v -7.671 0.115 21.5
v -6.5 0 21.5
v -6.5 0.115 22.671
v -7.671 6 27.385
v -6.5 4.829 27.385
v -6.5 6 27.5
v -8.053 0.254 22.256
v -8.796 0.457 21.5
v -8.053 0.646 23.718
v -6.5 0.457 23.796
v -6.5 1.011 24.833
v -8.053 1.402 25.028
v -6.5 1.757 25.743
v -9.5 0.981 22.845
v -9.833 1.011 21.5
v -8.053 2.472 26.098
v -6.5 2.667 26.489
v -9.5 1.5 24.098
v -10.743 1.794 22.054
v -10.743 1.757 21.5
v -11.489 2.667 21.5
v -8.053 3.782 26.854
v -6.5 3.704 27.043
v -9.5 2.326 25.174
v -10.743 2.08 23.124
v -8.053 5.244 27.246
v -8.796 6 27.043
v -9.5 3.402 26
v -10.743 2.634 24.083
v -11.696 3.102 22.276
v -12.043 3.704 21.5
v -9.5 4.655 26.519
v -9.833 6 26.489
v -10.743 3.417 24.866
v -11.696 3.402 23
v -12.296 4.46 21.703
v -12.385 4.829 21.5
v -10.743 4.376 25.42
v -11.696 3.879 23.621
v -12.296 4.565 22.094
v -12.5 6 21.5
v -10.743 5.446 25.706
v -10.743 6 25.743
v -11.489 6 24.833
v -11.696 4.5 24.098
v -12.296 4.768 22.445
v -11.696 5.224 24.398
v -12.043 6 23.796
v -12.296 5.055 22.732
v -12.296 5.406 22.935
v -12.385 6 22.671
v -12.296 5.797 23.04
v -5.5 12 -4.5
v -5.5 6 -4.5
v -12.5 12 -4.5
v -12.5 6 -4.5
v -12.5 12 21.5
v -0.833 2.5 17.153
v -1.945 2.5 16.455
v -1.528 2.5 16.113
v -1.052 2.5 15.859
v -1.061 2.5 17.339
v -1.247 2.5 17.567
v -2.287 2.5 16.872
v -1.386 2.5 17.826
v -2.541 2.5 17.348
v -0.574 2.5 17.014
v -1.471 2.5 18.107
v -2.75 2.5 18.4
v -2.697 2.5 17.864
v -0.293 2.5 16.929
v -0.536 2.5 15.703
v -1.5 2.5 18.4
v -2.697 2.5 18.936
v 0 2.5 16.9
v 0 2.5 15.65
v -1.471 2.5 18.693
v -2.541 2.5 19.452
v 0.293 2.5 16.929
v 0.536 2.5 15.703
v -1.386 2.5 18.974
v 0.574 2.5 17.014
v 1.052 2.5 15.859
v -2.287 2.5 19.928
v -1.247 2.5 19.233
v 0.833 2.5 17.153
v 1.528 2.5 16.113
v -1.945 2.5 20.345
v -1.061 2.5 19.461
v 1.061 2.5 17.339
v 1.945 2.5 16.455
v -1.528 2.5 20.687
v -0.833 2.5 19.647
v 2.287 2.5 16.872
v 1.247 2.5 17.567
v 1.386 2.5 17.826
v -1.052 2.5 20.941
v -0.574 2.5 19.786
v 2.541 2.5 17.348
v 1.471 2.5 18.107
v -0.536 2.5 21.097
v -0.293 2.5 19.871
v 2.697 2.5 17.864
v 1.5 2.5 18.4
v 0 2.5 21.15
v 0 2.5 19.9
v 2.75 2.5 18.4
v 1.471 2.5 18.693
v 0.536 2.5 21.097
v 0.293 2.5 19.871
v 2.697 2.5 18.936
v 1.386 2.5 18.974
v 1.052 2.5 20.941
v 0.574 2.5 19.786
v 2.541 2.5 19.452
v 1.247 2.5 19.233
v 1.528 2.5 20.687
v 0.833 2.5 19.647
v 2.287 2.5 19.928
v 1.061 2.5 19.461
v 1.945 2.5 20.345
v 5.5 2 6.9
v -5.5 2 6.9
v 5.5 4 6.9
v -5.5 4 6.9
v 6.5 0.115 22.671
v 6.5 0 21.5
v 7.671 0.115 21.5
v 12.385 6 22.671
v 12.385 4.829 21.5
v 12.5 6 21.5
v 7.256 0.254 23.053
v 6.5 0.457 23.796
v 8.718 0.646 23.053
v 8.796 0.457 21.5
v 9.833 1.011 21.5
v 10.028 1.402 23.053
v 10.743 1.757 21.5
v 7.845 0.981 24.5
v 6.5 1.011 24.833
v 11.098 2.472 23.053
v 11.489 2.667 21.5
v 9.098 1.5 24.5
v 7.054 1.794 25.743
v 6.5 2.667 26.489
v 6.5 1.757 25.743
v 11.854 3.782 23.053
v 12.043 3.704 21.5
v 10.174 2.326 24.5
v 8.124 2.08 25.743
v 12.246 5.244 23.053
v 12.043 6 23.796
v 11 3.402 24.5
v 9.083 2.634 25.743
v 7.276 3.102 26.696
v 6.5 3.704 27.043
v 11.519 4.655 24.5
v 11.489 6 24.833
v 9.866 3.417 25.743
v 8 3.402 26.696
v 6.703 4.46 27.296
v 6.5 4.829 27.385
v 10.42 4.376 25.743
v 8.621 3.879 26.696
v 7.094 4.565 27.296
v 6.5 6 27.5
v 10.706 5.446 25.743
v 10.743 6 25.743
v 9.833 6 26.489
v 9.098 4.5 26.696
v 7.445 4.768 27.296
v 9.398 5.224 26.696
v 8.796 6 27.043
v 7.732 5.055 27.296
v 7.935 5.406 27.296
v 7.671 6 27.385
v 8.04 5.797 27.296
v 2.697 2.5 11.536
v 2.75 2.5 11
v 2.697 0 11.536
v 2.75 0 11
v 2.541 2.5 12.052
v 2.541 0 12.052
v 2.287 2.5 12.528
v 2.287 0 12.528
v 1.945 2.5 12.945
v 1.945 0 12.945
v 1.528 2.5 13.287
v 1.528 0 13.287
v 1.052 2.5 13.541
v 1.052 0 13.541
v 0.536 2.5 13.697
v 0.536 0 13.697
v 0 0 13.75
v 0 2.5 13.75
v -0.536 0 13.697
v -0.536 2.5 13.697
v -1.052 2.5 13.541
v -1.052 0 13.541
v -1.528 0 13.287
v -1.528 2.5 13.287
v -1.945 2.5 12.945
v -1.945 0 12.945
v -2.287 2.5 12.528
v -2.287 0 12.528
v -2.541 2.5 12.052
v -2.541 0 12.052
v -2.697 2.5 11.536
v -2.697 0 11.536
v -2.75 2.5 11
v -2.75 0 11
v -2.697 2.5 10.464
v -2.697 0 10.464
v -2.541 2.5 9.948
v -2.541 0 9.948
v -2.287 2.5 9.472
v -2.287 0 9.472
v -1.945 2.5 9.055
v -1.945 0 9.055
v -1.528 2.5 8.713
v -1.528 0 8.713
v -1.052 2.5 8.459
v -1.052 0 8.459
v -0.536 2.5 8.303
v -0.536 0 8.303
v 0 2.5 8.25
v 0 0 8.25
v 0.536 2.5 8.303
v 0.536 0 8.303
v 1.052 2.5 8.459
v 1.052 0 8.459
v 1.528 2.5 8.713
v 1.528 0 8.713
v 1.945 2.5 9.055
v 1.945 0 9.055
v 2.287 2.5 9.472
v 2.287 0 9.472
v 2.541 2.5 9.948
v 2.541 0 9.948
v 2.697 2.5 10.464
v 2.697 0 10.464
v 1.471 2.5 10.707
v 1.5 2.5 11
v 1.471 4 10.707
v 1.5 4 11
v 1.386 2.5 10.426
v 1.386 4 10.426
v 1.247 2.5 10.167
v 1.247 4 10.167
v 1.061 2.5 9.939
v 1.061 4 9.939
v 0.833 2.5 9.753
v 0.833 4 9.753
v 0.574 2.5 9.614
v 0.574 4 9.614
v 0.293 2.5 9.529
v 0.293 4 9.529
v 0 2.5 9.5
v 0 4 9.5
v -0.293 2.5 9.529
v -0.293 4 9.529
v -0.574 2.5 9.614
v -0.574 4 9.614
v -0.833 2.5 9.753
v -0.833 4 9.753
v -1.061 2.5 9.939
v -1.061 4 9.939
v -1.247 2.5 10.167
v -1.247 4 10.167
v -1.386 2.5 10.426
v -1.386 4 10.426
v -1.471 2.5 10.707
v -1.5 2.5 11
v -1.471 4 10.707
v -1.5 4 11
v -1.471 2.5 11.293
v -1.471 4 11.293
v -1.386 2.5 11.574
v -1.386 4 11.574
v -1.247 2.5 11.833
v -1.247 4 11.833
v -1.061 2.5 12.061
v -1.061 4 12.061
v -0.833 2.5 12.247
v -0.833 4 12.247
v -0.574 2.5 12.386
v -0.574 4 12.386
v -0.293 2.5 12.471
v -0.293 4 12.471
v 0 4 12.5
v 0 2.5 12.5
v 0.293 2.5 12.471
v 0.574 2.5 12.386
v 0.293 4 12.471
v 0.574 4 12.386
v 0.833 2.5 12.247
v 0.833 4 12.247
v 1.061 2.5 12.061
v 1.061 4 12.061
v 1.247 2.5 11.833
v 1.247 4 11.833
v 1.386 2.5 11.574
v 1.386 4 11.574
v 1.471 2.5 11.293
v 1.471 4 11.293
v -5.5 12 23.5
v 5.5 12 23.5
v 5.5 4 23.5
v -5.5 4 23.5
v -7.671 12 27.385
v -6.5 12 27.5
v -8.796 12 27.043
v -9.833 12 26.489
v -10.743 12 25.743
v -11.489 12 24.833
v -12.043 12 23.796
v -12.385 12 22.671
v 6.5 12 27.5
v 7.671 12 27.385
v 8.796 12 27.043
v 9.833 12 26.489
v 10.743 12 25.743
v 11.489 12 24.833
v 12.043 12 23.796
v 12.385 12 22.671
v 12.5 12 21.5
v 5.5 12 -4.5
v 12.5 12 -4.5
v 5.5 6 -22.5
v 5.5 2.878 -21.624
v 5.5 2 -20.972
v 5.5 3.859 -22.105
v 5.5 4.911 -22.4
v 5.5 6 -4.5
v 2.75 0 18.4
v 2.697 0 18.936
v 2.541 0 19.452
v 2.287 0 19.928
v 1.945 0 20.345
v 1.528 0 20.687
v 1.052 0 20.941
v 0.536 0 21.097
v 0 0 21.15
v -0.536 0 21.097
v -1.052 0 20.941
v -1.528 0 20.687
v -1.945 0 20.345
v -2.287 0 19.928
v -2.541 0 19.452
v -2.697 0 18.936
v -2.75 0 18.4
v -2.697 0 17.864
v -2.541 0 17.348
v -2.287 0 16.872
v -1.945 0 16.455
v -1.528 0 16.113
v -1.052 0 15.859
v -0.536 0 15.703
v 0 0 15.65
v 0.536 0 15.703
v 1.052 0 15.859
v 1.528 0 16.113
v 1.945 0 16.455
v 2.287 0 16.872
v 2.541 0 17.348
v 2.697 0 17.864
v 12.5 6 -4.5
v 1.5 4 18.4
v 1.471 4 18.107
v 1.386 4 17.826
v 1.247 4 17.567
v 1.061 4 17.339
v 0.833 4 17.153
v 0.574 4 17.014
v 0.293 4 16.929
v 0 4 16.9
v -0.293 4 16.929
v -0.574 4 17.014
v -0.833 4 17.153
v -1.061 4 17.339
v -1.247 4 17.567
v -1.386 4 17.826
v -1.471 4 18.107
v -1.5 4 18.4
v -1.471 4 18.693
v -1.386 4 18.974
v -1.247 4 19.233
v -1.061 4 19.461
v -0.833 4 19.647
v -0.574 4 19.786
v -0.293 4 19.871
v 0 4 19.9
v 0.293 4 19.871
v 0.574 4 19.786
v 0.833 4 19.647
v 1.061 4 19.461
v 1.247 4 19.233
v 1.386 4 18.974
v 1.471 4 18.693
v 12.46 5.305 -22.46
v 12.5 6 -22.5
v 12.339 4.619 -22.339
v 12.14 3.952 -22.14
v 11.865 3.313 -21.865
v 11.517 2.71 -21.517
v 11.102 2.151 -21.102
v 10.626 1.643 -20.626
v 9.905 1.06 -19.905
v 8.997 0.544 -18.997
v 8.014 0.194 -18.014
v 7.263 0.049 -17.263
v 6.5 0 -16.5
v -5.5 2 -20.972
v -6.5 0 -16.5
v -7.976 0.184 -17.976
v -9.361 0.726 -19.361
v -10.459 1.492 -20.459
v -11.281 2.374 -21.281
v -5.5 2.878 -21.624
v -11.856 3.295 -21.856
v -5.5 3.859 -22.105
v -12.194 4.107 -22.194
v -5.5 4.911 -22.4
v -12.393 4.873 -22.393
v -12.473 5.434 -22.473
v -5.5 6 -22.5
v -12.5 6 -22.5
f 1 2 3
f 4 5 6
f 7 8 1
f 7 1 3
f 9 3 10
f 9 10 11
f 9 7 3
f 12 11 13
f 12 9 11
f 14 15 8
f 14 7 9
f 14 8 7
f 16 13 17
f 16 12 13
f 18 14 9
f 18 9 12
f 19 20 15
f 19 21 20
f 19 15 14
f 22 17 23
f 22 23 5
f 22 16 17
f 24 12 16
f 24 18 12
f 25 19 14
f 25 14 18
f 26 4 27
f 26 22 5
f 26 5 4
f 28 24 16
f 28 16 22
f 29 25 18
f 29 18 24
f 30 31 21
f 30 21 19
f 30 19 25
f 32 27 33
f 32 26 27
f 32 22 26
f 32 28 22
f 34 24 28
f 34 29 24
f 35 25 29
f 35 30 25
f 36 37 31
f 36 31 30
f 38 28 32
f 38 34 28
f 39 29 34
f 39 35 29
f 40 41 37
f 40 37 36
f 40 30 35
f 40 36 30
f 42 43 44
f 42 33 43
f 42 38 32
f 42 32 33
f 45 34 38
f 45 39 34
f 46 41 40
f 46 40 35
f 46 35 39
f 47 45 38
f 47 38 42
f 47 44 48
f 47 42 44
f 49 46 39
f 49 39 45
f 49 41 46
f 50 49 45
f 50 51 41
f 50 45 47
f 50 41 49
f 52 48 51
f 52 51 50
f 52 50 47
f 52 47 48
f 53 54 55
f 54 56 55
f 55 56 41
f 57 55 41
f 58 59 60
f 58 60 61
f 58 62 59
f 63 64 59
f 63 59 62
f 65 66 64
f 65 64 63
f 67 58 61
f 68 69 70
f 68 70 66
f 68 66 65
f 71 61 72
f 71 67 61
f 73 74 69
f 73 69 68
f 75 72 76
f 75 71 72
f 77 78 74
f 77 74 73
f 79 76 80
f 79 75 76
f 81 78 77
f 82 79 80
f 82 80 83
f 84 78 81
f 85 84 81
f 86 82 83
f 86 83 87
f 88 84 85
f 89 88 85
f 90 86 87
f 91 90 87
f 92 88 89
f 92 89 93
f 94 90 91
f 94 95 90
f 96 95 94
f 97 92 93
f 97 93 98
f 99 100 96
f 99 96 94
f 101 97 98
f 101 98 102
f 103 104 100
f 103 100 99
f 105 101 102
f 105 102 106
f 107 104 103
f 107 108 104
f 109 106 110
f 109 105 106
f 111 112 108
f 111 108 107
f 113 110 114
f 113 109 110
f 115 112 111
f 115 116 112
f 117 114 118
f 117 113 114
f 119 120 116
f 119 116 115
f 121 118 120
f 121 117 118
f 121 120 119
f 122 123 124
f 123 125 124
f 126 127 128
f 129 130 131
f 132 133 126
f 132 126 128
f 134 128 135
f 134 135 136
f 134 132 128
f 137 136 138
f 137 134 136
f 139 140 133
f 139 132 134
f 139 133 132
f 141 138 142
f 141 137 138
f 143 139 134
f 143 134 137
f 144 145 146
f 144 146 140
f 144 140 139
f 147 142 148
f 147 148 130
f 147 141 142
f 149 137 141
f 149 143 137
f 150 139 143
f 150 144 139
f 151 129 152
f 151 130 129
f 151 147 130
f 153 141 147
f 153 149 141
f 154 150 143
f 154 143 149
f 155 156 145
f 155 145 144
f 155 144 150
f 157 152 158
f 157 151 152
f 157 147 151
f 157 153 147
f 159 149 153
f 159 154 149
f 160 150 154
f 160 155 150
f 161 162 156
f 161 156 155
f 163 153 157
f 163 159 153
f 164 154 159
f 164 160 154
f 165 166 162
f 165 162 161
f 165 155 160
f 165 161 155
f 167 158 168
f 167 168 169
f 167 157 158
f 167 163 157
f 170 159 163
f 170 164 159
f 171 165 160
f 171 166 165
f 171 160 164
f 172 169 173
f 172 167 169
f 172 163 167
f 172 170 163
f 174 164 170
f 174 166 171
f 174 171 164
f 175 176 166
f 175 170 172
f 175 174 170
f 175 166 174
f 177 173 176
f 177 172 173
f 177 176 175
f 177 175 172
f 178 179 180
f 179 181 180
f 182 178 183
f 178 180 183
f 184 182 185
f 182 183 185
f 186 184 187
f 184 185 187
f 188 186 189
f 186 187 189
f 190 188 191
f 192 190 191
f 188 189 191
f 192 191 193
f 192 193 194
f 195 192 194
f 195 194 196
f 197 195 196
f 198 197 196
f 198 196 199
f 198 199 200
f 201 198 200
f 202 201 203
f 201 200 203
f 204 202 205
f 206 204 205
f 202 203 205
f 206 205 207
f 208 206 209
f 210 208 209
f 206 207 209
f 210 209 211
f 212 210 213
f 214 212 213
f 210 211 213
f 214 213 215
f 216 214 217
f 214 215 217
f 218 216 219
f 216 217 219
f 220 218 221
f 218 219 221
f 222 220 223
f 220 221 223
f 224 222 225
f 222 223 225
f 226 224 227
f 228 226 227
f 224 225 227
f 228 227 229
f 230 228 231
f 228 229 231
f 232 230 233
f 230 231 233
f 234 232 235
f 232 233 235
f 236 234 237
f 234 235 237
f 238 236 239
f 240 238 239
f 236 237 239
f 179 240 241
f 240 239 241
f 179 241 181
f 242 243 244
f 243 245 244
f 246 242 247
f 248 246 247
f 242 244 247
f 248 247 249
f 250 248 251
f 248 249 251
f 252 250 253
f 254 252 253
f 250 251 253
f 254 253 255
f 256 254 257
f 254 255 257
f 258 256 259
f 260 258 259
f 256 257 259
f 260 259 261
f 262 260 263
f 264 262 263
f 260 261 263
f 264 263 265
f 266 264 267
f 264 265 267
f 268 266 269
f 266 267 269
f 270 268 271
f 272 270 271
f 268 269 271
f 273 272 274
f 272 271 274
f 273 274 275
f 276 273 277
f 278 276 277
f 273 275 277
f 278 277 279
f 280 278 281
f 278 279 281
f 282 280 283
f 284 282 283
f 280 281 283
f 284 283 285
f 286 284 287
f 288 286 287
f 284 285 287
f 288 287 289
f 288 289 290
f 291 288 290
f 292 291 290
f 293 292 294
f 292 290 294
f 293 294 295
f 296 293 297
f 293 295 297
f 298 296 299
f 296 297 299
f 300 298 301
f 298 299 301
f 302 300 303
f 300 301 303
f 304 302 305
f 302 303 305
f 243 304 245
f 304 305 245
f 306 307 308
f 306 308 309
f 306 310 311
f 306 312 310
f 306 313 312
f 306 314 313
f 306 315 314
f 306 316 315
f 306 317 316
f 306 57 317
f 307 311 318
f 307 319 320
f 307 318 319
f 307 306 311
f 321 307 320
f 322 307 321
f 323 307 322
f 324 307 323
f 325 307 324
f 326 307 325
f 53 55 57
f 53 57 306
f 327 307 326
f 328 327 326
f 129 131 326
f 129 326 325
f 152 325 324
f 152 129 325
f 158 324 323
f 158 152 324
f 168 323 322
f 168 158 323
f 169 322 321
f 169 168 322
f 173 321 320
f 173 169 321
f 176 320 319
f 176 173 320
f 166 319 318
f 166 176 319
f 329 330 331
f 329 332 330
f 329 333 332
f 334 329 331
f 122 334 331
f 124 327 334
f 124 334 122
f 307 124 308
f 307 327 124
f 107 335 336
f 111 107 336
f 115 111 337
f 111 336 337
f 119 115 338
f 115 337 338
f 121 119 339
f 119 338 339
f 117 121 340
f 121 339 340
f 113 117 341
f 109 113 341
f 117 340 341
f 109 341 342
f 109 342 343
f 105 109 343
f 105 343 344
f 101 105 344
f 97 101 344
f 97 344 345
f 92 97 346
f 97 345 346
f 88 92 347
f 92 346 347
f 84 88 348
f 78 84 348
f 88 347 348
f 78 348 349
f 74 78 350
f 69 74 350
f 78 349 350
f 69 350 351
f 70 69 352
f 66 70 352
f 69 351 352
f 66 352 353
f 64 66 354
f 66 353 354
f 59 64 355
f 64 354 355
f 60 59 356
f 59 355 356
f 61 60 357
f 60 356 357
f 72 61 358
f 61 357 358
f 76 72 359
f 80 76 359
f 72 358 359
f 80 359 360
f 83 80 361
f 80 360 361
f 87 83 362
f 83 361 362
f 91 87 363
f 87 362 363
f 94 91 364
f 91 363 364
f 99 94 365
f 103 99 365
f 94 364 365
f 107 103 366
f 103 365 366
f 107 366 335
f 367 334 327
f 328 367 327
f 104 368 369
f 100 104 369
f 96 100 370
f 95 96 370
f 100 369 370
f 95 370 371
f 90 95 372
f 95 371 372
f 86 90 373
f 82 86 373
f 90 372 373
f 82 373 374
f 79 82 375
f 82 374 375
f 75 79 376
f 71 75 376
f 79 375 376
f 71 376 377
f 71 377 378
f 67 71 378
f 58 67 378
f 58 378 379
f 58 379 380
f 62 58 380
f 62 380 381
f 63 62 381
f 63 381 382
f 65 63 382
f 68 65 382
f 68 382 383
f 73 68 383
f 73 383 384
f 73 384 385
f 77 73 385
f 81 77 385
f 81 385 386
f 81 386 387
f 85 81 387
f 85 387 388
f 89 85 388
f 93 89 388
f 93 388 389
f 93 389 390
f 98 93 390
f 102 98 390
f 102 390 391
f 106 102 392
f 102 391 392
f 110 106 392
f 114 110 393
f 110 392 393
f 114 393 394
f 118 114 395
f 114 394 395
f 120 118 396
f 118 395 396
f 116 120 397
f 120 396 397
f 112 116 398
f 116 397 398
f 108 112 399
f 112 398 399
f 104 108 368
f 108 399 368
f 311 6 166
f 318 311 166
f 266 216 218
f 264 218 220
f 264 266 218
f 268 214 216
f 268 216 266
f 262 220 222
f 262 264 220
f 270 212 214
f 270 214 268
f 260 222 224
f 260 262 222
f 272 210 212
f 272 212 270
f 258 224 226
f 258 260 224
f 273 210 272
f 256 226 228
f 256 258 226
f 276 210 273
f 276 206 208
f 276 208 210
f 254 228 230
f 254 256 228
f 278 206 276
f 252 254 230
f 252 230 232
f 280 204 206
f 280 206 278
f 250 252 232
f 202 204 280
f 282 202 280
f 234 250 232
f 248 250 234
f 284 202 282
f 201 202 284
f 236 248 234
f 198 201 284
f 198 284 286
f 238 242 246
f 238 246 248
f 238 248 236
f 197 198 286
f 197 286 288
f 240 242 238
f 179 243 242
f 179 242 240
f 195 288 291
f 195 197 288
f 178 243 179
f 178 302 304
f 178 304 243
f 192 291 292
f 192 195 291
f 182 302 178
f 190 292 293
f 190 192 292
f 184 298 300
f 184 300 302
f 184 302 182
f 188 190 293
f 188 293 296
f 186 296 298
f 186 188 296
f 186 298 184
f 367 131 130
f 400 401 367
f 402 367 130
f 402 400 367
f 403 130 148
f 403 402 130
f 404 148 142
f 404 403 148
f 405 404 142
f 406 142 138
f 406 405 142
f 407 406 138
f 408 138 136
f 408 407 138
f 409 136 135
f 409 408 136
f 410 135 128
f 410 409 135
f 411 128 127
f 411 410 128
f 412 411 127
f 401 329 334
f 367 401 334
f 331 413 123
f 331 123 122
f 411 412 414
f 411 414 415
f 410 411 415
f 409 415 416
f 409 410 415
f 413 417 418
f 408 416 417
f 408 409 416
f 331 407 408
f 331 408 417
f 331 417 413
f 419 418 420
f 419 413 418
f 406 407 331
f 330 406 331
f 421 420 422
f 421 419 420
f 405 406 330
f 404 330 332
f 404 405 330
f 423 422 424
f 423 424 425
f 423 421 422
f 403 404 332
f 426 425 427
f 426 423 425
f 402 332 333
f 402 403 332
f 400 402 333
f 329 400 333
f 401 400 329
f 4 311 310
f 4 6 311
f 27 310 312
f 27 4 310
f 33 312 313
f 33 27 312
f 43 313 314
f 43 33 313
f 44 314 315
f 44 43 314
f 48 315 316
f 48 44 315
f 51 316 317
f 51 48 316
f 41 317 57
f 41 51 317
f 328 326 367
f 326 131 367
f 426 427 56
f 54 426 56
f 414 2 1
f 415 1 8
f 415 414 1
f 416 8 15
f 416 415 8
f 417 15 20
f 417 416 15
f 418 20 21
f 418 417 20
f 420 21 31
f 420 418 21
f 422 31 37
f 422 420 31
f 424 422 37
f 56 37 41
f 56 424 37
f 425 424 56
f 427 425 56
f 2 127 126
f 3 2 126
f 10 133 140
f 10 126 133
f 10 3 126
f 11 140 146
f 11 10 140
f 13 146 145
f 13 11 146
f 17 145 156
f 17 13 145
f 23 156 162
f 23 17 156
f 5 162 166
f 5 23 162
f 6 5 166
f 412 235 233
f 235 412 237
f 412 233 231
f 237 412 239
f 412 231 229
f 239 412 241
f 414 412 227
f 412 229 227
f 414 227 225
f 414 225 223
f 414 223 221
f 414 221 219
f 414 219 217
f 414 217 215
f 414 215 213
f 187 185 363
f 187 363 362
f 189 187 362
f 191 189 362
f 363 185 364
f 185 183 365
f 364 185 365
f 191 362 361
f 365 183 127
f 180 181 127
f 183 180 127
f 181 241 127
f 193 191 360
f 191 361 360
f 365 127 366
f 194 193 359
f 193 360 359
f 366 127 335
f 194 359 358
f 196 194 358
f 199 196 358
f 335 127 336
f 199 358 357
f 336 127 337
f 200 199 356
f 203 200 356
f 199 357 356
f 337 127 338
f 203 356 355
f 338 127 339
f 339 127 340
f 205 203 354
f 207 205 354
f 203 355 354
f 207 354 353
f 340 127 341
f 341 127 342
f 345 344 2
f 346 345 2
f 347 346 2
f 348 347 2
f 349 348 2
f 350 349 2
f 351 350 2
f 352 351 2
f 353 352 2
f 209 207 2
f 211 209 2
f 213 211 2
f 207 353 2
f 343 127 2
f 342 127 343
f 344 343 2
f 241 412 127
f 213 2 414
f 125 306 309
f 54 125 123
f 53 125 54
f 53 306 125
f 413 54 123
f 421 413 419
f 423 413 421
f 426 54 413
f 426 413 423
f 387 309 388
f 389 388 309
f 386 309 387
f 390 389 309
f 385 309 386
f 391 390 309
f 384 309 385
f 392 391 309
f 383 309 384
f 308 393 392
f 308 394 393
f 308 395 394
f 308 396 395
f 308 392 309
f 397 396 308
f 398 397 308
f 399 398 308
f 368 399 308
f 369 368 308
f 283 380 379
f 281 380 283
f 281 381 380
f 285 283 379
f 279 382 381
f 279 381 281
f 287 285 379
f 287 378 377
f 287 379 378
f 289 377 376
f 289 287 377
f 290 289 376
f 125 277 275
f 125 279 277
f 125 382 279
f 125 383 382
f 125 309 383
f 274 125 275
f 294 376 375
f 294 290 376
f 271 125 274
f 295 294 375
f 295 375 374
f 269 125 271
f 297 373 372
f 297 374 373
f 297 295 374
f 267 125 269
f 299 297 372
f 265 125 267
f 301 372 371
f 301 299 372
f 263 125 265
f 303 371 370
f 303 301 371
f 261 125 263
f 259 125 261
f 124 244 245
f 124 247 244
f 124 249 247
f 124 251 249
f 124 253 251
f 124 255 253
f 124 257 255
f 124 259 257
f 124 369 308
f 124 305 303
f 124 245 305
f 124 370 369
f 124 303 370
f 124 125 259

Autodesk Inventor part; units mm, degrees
ref_plane "YZ Plane" through (0, 0, 0) normal (1, 0, 0) x (0, 1, 0)
ref_plane "XZ Plane" through (0, 0, 0) normal (0, 1, 0) x (-1, 0, 0)
ref_plane "XY Plane" through (0, 0, 0) normal (0, 0, 1) x (1, 0, 0)
sketch "スケッチ1" plane through (0, 0, 0) normal (0, 1, 0) x (-1, 0, 0)
  line L0 (12.5, 22.5) -> (-12.5, 22.5)
  line L1 (-12.5, 22.5) -> (-12.5, -22.5)
  line L2 (-12.5, -22.5) -> (12.5, -22.5)
  line L3 (12.5, -22.5) -> (12.5, 22.5)
  line L4 (12.5, 22.5) -> (-12.5, -22.5) construction
  line L5 (-12.5, 22.5) -> (12.5, -22.5) construction
  line L6 (12.5, 22.5) -> (12.5, 27.5)
  line L7 (12.5, 27.5) -> (-12.5, 27.5)
  line L8 (-12.5, 27.5) -> (-12.5, 22.5)
  point P0 (0, 0)
  dimension "d0" = 45
  dimension "d2" = 25
  dimension "d3" = 5
extrude "押し出し1" add sketch "スケッチ1" along normal blind 2
sketch "スケッチ2" plane through (0, 2, 0) normal (0, 1, 0) x (1, 0, 0)
  line L0 (-12.5, -27.5) -> (12.5, -27.5) construction
  line L1 (12.5, -27.5) -> (12.5, 22.5) construction
  line L2 (12.5, 22.5) -> (-12.5, 22.5) construction
  line L3 (-12.5, 22.5) -> (-12.5, -27.5) construction
  line L4 (0, 32.5) -> (0, -37.5) construction
  line L5 (-12.5, -27.5) -> (12.5, -27.5)
  line L6 (12.5, -27.5) -> (12.5, 22.5)
  line L7 (12.5, 22.5) -> (-12.5, 22.5)
  line L8 (-12.5, 22.5) -> (-12.5, -27.5)
  line L9 (-12.5, 22.5) -> (-12.5, -27.5) projected
  line L10 (12.5, 22.5) -> (-12.5, 22.5) projected
  point P0 (0, 0)
  point P1 (0, -27.5)
extrude "押し出し2" add sketch "スケッチ2" along normal blind 2
sketch "スケッチ3" plane through (0, 4, 0) normal (0, 1, 0) x (1, 0, 0)
  line L0 (-12.5, 22.5) -> (-12.5, -2) construction
  line L1 (-12.5, -2) -> (12.5, -2) construction
  line L2 (12.5, -2) -> (12.5, 22.5) construction
  line L3 (12.5, 22.5) -> (-12.5, 22.5) construction
  line L4 (-12.5, 22.5) -> (-12.5, -2) construction
  line L5 (-12.5, -27.5) -> (12.5, -27.5)
  line L6 (12.5, -27.5) -> (12.5, 22.5)
  line L7 (12.5, 22.5) -> (-12.5, 22.5)
  line L8 (-12.5, 22.5) -> (-12.5, -27.5)
  line L9 (-12.5, -27.5) -> (12.5, -27.5) construction
  point P0 (0, 0)
extrude "押し出し3" add sketch "スケッチ3" along normal blind 8
sketch "スケッチ4" plane through (0, 12, 0) normal (0, 1, 0) x (1, 0, 0)
  line L0 (12.5, -2) -> (12.5, 22.5) construction
  line L1 (-5.5, 22.5) -> (5.5, 22.5)
  line L2 (5.5, 22.5) -> (5.5, -23.5)
  line L3 (5.5, -23.5) -> (-5.5, -23.5)
  line L4 (-5.5, -23.5) -> (-5.5, 22.5)
  line L5 (0, 32.5) -> (0, -37.5) construction
  circle A0 centre (0, -18.4) radius 1.5
  circle A1 centre (0, -11) radius 1.5
  line L6 (-17.5, 0) -> (17.5, 0) construction
  line L7 (-5.5, -6.9) -> (5.5, -6.9)
  line L8 (12.5, -27.5) -> (12.5, 22.5) construction
  line L9 (12.5, 22.5) -> (-12.5, 22.5) construction
  line L10 (-12.5, 22.5) -> (-12.5, -27.5) construction
  line L11 (-12.5, -27.5) -> (12.5, -27.5) construction
  line L12 (12.5, 22.5) -> (-12.5, 22.5) projected
  point P0 (0, 0)
  point P1 (0, -23.5)
  dimension "d14" = 11
  dimension "d15" = 3
  dimension "d16" = 7.4
  dimension "d17" = 22
  dimension "d24" = 16.6
  dimension "d27" = 46
extrude "押し出し4" cut sketch "スケッチ4" against normal blind 8 contours L1 L2 L7 L4 | L7 L2 L3 L4 | A0 | A1
extrude "押し出し5" cut sketch "スケッチ4" against normal through all contours A0 | A1
extrude "押し出し6" cut sketch "スケッチ4" against normal blind 10 contours L1 L2 L7 L4
sketch "スケッチ5" plane through (0, 0, 0) normal (0, -1, 0) x (1, 0, 0)
  circle A0 centre (0, 18.4) radius 1.5 construction
  circle A1 centre (0, 11) radius 1.5 construction
  circle A2 centre (0, 18.4) radius 2.75
  circle A3 centre (0, 11) radius 2.75
  point P0 (0, 0)
  dimension "d28" = 5.5
extrude "押し出し7" cut sketch "スケッチ5" against normal blind 2.5
fillet "フィレット1" radius 6 6 edges at (12.5, 0, 2.5) (-12.5, 0, 2.5) (0, 0, 27.5) (12.5, 6, 27.5) (-12.5, 6, 27.5) (0, 0, -22.5)
sketch "スケッチ6" plane through (0, 0, 0) normal (1, 0, 0) x (0, 1, 0)
  line L0 (12, 23.5) -> (12, -22.5) construction
  line L1 (12, -22.5) -> (2, -22.5) construction
  line L2 (12, -22.5) -> (6, -22.5)
  line L3 (6, -22.5) -> (6, -4.5)
  line L4 (6, -4.5) -> (12, -4.5)
  line L5 (12, -4.5) -> (12, -22.5)
  point P0 (0, 0)
  dimension "d32" = 6
  dimension "d33" = 18
extrude "押し出し8" cut sketch "スケッチ6" along normal through all both and the other way through all
sketch "スケッチ7" plane through (0, 12, 0) normal (0, 1, 0) x (1, 0, 0)
  line L0 (5.5, -6.9) -> (-5.5, -6.9) projected
  line L1 (-28.6346, -6.9) -> (35.9523, -6.9)
  line L2 (35.9523, -6.9) -> (35.9523, 63.9707)
  line L3 (35.9523, 63.9707) -> (-28.6346, 63.9707)
  line L4 (-28.6346, 63.9707) -> (-28.6346, -6.9)
  point P0 (0, 0)
properties part number "pressure_plate" material "ABS プラスチック"
